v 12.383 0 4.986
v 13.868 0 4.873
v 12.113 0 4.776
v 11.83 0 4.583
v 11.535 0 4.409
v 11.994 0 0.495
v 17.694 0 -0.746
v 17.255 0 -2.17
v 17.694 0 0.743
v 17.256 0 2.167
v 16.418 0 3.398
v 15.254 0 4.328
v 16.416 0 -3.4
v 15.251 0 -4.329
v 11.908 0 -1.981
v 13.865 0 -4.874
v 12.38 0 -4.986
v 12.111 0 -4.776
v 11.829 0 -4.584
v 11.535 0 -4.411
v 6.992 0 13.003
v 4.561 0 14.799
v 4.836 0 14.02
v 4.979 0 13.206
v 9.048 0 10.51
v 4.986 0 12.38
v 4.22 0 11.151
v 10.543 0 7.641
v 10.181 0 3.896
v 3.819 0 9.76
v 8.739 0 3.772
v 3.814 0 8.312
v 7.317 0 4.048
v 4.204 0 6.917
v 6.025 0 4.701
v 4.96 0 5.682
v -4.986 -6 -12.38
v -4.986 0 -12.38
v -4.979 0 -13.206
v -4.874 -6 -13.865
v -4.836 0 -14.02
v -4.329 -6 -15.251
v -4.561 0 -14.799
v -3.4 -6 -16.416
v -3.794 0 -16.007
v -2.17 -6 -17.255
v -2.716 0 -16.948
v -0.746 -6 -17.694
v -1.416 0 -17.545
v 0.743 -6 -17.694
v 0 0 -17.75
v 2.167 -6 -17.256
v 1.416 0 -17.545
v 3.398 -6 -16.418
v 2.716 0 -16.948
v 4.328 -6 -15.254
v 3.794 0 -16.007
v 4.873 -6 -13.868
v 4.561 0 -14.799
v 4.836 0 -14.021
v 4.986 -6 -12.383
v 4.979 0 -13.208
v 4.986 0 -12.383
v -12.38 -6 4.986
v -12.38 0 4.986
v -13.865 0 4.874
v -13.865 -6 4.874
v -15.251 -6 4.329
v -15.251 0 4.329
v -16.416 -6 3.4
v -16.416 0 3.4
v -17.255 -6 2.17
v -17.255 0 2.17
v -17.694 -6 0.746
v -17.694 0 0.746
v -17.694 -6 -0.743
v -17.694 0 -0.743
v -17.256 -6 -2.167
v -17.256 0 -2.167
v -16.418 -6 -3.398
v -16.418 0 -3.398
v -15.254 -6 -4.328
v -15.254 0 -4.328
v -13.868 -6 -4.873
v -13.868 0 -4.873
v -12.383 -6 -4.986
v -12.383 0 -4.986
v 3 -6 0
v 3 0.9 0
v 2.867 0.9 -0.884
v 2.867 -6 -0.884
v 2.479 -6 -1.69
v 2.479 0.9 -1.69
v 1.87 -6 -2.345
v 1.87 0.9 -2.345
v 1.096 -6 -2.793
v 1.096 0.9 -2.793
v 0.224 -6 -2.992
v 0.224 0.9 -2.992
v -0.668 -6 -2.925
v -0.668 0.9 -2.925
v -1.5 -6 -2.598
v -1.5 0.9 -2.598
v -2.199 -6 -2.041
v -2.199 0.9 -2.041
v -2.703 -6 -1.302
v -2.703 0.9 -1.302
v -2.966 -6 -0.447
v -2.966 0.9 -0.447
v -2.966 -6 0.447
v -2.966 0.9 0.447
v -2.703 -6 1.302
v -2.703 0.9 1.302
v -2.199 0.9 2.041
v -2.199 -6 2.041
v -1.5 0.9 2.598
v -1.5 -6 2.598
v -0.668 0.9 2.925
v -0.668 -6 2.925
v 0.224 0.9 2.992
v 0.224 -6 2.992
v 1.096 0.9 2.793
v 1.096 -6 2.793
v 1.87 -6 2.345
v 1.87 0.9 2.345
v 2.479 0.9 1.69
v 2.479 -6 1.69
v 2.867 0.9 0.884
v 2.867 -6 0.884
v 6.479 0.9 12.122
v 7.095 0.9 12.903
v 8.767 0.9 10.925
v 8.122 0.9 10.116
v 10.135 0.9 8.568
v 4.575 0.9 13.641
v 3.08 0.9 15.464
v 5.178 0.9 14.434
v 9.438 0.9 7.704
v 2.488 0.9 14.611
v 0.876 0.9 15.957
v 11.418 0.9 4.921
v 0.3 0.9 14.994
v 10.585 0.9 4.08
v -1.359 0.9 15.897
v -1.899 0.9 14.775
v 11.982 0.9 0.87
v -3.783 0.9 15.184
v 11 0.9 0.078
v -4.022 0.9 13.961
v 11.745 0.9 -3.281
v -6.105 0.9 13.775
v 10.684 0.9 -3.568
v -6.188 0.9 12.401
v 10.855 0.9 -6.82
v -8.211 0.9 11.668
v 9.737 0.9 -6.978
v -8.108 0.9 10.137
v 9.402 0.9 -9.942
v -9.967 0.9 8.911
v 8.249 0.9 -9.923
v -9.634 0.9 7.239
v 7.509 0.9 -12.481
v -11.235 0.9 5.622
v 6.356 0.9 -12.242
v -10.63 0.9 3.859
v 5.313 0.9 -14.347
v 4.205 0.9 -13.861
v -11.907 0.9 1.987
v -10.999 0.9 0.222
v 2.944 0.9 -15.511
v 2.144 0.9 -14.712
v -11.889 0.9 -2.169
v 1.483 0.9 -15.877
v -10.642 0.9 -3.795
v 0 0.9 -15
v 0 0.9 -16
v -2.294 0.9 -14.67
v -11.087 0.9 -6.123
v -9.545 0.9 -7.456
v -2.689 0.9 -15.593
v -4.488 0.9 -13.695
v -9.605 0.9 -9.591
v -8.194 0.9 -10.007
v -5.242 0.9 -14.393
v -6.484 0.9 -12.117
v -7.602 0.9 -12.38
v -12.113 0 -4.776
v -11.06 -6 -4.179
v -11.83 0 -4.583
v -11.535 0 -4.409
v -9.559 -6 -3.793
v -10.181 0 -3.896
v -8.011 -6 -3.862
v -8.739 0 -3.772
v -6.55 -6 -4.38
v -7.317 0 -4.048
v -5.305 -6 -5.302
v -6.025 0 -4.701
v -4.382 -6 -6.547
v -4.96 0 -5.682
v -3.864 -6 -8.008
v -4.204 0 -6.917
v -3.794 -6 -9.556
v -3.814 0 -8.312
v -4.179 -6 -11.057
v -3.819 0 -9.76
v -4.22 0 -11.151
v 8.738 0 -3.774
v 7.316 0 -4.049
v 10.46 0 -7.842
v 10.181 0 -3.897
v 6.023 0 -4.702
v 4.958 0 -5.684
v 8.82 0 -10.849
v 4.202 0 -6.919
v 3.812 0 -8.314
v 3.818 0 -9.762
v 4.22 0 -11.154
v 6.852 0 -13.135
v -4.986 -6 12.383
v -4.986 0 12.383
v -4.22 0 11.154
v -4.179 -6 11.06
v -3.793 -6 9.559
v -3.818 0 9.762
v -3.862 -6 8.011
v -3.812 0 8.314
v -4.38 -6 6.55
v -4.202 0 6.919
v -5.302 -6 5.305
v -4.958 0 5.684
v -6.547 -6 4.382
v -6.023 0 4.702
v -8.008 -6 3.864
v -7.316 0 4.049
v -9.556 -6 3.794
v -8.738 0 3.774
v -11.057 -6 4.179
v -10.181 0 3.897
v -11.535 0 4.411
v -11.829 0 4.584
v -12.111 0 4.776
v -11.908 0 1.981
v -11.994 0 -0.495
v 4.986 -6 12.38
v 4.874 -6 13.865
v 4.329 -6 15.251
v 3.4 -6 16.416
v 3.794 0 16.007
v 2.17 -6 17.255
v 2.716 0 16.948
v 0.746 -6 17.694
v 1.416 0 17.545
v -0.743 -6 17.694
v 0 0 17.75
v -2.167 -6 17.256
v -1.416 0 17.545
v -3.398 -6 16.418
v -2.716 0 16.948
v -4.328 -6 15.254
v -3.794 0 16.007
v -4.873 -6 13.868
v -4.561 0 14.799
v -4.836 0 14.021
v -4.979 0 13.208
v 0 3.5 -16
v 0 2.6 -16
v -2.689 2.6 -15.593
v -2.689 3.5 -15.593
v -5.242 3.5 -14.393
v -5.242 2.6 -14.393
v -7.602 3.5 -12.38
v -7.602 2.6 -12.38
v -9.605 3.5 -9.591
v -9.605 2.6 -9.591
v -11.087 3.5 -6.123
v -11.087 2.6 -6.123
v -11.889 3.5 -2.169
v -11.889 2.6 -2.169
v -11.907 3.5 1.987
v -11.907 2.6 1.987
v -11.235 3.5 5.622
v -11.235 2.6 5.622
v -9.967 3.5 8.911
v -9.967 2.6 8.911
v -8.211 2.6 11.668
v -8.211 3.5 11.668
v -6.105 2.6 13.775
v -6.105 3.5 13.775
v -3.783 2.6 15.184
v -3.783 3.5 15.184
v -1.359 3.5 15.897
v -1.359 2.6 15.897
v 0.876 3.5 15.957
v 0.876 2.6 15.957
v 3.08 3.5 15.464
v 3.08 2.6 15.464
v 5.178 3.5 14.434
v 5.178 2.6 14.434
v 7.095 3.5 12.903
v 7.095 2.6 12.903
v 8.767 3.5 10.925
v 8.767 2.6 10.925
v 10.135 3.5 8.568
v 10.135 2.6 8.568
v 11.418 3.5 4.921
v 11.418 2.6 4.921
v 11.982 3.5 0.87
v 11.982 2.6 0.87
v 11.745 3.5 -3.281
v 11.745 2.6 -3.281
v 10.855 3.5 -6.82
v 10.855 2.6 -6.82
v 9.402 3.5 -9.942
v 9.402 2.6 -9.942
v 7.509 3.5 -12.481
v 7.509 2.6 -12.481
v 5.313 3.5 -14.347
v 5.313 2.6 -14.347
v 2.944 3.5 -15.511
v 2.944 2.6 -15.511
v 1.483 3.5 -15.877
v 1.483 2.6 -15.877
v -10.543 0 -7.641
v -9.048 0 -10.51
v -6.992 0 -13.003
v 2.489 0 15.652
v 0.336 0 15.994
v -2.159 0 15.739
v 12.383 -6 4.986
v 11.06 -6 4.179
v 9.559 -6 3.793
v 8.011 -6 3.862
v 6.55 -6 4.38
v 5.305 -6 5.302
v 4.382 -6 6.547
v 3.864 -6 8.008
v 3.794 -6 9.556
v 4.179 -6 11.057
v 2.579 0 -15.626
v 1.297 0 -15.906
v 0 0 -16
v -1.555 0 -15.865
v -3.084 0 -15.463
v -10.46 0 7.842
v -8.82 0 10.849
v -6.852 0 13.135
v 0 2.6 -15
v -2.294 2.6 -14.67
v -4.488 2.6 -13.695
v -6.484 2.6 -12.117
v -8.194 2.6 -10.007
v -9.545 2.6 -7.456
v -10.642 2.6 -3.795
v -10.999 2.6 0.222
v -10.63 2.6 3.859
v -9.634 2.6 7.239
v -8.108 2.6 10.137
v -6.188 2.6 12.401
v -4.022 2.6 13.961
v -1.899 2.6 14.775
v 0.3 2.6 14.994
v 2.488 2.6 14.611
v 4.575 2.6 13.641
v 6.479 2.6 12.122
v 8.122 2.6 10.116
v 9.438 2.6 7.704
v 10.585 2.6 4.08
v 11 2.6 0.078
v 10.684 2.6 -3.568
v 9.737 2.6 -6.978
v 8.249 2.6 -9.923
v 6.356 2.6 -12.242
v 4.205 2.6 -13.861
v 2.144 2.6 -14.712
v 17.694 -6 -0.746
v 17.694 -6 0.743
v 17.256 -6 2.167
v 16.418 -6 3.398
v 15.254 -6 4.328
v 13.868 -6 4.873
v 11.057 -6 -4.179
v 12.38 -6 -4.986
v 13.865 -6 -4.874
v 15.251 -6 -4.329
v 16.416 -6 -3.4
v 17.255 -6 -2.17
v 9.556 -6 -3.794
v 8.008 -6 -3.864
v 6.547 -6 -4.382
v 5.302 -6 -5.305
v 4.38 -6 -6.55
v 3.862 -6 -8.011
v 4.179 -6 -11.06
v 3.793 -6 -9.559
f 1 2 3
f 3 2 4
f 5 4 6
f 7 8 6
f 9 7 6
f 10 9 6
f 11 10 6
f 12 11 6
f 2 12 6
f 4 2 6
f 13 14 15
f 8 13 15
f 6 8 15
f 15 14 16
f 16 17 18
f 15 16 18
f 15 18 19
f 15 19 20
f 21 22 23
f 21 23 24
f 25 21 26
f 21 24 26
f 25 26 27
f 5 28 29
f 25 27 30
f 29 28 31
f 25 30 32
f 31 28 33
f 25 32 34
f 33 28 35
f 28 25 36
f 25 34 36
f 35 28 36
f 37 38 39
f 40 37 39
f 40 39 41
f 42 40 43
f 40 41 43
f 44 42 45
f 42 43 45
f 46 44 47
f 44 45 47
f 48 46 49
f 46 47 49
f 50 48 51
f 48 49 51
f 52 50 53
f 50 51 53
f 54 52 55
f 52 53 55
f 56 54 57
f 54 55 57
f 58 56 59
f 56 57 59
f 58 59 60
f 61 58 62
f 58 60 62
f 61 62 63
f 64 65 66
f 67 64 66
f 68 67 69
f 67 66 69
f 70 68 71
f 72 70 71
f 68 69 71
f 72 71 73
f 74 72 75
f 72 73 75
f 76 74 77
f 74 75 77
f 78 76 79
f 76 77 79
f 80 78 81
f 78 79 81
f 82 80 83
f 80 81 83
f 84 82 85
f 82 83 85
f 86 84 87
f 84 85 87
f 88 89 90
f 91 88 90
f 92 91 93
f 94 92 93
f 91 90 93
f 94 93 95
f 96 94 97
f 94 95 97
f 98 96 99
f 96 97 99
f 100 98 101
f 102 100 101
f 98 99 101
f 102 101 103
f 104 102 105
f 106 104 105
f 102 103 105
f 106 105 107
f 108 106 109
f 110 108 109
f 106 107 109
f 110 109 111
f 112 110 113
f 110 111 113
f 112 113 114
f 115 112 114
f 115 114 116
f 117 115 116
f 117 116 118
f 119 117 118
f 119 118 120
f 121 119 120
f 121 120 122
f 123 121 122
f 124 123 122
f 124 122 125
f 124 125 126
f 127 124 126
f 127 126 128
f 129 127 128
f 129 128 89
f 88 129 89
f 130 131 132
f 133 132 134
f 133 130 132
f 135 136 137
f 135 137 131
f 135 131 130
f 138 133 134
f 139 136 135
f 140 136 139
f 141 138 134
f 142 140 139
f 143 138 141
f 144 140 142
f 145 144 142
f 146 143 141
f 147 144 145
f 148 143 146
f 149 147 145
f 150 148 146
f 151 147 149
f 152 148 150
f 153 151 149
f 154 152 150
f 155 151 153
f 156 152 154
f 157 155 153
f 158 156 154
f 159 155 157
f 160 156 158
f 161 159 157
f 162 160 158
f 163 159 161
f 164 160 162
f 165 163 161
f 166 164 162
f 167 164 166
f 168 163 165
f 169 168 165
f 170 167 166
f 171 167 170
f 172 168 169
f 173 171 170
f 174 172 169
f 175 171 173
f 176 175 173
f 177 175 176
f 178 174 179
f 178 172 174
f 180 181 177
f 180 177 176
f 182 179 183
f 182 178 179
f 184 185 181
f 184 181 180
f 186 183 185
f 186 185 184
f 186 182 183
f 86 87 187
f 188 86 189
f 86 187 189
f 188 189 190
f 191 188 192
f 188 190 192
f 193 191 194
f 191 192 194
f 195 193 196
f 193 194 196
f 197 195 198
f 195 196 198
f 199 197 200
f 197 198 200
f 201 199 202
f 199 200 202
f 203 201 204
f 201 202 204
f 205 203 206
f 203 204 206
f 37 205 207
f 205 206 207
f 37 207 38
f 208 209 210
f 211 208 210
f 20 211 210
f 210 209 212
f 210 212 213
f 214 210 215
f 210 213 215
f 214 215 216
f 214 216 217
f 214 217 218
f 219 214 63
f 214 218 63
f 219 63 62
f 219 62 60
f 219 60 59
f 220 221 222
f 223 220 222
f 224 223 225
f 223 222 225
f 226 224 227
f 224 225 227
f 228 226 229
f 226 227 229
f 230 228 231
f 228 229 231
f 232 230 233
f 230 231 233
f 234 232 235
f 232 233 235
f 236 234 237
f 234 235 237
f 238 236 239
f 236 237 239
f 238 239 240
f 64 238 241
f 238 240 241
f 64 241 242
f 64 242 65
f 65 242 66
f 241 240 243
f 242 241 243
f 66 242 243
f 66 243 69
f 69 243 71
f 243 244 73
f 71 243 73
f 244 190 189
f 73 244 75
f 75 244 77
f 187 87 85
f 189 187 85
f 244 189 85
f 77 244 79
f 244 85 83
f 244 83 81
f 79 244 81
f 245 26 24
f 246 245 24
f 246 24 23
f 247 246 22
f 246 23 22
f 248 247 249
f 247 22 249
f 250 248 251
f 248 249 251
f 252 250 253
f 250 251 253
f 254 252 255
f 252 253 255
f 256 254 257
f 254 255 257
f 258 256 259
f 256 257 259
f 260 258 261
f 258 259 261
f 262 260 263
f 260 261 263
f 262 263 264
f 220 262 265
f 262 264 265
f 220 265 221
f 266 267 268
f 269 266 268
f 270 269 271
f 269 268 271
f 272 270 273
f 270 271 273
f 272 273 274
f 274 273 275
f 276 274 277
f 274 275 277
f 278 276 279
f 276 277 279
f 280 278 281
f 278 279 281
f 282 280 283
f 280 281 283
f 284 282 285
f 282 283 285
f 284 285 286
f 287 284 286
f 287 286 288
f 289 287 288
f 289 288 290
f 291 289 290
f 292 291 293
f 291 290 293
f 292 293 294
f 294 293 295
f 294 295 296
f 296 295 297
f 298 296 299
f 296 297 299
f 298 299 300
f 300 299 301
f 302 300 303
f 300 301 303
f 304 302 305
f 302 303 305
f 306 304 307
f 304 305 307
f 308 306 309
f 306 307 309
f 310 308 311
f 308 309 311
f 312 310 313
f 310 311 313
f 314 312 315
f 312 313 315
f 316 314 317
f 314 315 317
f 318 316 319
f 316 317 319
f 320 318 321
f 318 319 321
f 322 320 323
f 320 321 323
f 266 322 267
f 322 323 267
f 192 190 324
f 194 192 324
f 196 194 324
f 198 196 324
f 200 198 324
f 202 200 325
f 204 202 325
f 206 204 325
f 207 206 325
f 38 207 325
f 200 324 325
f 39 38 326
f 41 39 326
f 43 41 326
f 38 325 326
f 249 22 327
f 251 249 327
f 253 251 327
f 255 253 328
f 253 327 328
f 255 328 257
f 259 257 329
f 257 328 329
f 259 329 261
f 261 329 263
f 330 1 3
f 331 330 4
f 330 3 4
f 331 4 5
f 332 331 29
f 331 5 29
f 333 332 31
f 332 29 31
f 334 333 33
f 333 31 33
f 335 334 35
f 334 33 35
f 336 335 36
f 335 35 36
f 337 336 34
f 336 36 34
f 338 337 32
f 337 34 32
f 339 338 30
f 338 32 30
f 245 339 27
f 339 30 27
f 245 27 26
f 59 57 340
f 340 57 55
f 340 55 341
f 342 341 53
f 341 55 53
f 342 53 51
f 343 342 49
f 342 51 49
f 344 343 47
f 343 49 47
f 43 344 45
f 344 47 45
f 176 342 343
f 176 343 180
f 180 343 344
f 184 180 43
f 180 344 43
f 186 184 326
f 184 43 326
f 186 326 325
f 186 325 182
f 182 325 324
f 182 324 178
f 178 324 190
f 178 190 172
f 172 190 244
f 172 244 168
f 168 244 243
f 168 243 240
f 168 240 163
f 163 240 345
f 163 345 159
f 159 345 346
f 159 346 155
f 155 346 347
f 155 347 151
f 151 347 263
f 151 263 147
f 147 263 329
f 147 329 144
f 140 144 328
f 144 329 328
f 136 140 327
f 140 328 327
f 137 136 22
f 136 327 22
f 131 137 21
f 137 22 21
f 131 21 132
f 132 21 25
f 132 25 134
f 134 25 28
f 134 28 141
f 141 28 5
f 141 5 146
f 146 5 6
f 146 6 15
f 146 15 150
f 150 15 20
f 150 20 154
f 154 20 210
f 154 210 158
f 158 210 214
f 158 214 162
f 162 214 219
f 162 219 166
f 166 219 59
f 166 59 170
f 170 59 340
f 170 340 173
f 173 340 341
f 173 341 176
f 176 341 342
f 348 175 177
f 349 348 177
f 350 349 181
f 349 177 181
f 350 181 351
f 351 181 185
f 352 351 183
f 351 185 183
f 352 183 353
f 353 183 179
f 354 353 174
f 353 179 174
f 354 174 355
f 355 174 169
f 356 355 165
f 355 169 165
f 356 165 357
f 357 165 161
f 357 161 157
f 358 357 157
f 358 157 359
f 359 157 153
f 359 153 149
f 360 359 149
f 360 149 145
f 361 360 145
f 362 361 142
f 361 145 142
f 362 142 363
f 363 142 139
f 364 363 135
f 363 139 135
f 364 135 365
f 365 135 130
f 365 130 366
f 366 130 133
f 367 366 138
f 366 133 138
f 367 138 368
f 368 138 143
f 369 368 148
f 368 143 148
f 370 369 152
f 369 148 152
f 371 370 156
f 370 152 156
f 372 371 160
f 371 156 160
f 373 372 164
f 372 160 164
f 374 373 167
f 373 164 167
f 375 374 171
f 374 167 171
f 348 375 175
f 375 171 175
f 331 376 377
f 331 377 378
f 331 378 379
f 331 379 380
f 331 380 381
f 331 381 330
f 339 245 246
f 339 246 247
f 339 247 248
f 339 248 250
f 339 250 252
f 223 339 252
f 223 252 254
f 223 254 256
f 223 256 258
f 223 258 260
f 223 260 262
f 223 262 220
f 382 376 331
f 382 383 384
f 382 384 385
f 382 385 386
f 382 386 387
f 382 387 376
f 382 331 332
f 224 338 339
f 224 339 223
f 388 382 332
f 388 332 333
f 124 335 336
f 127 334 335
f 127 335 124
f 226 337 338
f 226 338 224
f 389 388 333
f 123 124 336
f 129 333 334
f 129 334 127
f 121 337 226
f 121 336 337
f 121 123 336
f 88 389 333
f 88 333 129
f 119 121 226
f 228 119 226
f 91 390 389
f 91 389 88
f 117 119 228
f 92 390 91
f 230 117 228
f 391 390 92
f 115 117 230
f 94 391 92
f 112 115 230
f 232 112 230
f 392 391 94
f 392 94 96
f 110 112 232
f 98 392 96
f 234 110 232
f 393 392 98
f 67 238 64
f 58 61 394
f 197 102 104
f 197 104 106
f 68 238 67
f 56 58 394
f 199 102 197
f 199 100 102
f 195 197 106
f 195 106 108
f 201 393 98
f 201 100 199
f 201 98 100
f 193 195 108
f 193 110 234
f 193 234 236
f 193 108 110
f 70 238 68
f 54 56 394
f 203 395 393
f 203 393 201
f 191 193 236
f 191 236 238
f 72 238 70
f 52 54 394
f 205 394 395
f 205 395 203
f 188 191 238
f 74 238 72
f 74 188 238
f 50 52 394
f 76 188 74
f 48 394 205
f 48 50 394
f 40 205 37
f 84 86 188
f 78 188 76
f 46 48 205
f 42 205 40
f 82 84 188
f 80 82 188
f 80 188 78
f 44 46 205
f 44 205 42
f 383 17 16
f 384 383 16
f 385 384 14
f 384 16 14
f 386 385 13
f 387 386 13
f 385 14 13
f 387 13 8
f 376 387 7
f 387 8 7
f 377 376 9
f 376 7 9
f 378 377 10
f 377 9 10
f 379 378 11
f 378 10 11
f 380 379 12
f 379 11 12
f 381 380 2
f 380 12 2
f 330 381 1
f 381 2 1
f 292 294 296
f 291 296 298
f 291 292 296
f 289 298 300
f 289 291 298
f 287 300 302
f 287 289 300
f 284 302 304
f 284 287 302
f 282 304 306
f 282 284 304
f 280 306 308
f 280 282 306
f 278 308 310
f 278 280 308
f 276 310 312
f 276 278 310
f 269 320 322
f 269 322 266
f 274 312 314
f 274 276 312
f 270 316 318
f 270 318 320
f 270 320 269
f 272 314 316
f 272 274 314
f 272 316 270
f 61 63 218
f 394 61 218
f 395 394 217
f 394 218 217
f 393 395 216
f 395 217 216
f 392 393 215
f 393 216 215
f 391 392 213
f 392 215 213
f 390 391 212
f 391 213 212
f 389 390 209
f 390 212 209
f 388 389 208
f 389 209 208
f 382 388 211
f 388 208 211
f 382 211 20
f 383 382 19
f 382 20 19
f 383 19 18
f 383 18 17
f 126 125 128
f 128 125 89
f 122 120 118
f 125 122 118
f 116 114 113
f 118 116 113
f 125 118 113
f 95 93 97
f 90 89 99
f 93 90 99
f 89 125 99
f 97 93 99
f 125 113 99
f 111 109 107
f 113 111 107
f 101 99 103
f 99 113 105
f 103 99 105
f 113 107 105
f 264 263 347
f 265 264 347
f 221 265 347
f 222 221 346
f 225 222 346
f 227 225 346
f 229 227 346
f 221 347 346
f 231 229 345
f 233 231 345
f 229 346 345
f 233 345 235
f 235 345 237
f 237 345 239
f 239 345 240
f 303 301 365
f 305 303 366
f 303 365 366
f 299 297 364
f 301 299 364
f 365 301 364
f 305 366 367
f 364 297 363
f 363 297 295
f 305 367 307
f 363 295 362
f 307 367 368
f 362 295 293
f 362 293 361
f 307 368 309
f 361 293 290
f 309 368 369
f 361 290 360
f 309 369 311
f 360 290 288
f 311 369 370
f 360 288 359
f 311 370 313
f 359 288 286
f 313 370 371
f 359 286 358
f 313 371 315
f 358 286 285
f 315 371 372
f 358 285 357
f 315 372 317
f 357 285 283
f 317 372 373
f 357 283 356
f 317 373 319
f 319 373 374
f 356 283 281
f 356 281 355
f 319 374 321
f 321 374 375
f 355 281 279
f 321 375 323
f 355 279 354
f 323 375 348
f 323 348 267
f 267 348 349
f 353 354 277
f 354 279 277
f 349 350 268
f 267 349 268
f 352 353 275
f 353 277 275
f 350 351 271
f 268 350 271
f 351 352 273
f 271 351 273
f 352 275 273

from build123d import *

# Parameters (mm, degrees)
SKETCH1_RX          = 16
SKETCH1_RY          = 12
BOSS_EXTRUDE1_DEPTH = 0.9
BOSS_EXTRUDE2_DEPTH = 6
SKETCH4_R           = 3
CUT_EXTRUDE1_DEPTH  = 10
SKETCH5_RX          = 15
SKETCH5_RY          = 11
BOSS_EXTRUDE3_DEPTH = 1.7
SKETCH6_RX          = 16
SKETCH6_RY          = 12
BOSS_EXTRUDE4_DEPTH = 0.9


with BuildPart() as part:
    # Sketch1 → Boss-Extrude1 (new body)
    with BuildSketch(Plane(origin=(0, 0, 0), x_dir=(1, 0, 0), z_dir=(0, 1, 0))):
        with Locations(Location((0, 0), (0, 0, 90))):
            Ellipse(SKETCH1_RX, SKETCH1_RY)
    extrude(amount=BOSS_EXTRUDE1_DEPTH)

    # Sketch3 → Boss-Extrude2 (add)
    with BuildSketch(Plane(origin=(0, 0, 0), x_dir=(-1, 0, 0), z_dir=(0, -1, 0))):
        with BuildLine():
            ThreePointArc((12.379824796, -4.986278203), (17.749999782, -0.001477913), (12.382772576, 4.986496167))
            ThreePointArc((12.382772576, 4.986496167), (5.304706978, 5.301894868), (4.986278203, 12.379824796))
            ThreePointArc((4.986278203, 12.379824796), (0.001477913, 17.749999782), (-4.986496167, 12.382772576))
            ThreePointArc((-4.986496167, 12.382772576), (-5.301894868, 5.304706978), (-12.379824796, 4.986278203))
            ThreePointArc((-12.379824796, 4.986278203), (-17.749999782, 0.001477913), (-12.382772576, -4.986496167))
            ThreePointArc((-12.382772576, -4.986496167), (-5.304706978, -5.301894868), (-4.986278203, -12.379824796))
            ThreePointArc((-4.986278203, -12.379824796), (-0.001477913, -17.749999782), (4.986496167, -12.382772576))
            ThreePointArc((4.986496167, -12.382772576), (5.301894868, -5.304706978), (12.379824796, -4.986278203))
        make_face()
    extrude(amount=BOSS_EXTRUDE2_DEPTH)

    # Sketch4 → Cut-Extrude1 (cut)
    with BuildSketch(Plane(origin=(0, 0.9, 0), x_dir=(1, 0, 0), z_dir=(0, 1, 0))):
        Circle(SKETCH4_R)
    extrude(amount=-CUT_EXTRUDE1_DEPTH, mode=Mode.SUBTRACT)

    # Sketch5 → Boss-Extrude3 (add)
    with BuildSketch(Plane(origin=(0, 0.9, 0), x_dir=(1, 0, 0), z_dir=(0, 1, 0))):
        with Locations(Location((0, 0), (0, 0, 90))):
            Ellipse(SKETCH5_RX, SKETCH5_RY)
    extrude(amount=BOSS_EXTRUDE3_DEPTH)

    # Sketch6 → Boss-Extrude4 (add)
    with BuildSketch(Plane(origin=(0, 2.6, 0), x_dir=(1, 0, 0), z_dir=(0, 1, 0))):
        with Locations(Location((0, 0), (0, 0, 90))):
            Ellipse(SKETCH6_RX, SKETCH6_RY)
    extrude(amount=BOSS_EXTRUDE4_DEPTH)


solid = part.part
